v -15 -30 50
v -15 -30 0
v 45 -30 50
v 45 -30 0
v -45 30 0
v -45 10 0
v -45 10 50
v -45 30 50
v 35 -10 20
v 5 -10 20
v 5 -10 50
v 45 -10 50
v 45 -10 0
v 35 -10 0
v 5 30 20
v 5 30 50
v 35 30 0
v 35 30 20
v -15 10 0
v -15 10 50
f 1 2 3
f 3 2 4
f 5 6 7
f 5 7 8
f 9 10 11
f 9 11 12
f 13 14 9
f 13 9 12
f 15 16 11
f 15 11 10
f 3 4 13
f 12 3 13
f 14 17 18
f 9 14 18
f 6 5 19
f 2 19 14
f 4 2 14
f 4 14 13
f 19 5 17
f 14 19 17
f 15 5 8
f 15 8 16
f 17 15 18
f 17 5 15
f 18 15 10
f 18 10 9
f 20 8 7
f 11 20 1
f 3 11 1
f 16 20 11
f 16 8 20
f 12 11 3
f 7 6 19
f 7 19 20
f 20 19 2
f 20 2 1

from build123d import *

# Parameters (mm, degrees)
CROQUIS2_W              = 90
CROQUIS2_H              = 60
SALIENTE_EXTRUIR1_DEPTH = 50
CROQUIS3_W              = 50
CROQUIS3_H              = 40
CORTAR_EXTRUIR3_DEPTH   = 30
CROQUIS5_W              = 30
CROQUIS5_H              = 30
CORTAR_EXTRUIR4_DEPTH   = 40


with BuildPart() as part:
    # Croquis2 → Saliente-Extruir1 (new body)
    with BuildSketch(Plane.XY):
        Rectangle(CROQUIS2_W, CROQUIS2_H)
    extrude(amount=SALIENTE_EXTRUIR1_DEPTH)

    # Croquis3 → Cortar-Extruir3 (cut)
    with BuildSketch(Plane.ZY.offset(45)):
        with Locations((25, -10)):
            Rectangle(CROQUIS3_W, CROQUIS3_H)
    extrude(amount=-CORTAR_EXTRUIR3_DEPTH, mode=Mode.SUBTRACT)

    # Croquis5 → Cortar-Extruir4 (cut)
    with BuildSketch(Plane(origin=(0, 30, 0), x_dir=(1, 0, 0), z_dir=(0, 1, 0))):
        with Locations((20, -35)):
            Rectangle(CROQUIS5_W, CROQUIS5_H)
        Polygon((45, -50), (45, 0), (35, 0), (35, -20), (35, -50), align=None)
    extrude(amount=-CORTAR_EXTRUIR4_DEPTH, mode=Mode.SUBTRACT)


solid = part.part
